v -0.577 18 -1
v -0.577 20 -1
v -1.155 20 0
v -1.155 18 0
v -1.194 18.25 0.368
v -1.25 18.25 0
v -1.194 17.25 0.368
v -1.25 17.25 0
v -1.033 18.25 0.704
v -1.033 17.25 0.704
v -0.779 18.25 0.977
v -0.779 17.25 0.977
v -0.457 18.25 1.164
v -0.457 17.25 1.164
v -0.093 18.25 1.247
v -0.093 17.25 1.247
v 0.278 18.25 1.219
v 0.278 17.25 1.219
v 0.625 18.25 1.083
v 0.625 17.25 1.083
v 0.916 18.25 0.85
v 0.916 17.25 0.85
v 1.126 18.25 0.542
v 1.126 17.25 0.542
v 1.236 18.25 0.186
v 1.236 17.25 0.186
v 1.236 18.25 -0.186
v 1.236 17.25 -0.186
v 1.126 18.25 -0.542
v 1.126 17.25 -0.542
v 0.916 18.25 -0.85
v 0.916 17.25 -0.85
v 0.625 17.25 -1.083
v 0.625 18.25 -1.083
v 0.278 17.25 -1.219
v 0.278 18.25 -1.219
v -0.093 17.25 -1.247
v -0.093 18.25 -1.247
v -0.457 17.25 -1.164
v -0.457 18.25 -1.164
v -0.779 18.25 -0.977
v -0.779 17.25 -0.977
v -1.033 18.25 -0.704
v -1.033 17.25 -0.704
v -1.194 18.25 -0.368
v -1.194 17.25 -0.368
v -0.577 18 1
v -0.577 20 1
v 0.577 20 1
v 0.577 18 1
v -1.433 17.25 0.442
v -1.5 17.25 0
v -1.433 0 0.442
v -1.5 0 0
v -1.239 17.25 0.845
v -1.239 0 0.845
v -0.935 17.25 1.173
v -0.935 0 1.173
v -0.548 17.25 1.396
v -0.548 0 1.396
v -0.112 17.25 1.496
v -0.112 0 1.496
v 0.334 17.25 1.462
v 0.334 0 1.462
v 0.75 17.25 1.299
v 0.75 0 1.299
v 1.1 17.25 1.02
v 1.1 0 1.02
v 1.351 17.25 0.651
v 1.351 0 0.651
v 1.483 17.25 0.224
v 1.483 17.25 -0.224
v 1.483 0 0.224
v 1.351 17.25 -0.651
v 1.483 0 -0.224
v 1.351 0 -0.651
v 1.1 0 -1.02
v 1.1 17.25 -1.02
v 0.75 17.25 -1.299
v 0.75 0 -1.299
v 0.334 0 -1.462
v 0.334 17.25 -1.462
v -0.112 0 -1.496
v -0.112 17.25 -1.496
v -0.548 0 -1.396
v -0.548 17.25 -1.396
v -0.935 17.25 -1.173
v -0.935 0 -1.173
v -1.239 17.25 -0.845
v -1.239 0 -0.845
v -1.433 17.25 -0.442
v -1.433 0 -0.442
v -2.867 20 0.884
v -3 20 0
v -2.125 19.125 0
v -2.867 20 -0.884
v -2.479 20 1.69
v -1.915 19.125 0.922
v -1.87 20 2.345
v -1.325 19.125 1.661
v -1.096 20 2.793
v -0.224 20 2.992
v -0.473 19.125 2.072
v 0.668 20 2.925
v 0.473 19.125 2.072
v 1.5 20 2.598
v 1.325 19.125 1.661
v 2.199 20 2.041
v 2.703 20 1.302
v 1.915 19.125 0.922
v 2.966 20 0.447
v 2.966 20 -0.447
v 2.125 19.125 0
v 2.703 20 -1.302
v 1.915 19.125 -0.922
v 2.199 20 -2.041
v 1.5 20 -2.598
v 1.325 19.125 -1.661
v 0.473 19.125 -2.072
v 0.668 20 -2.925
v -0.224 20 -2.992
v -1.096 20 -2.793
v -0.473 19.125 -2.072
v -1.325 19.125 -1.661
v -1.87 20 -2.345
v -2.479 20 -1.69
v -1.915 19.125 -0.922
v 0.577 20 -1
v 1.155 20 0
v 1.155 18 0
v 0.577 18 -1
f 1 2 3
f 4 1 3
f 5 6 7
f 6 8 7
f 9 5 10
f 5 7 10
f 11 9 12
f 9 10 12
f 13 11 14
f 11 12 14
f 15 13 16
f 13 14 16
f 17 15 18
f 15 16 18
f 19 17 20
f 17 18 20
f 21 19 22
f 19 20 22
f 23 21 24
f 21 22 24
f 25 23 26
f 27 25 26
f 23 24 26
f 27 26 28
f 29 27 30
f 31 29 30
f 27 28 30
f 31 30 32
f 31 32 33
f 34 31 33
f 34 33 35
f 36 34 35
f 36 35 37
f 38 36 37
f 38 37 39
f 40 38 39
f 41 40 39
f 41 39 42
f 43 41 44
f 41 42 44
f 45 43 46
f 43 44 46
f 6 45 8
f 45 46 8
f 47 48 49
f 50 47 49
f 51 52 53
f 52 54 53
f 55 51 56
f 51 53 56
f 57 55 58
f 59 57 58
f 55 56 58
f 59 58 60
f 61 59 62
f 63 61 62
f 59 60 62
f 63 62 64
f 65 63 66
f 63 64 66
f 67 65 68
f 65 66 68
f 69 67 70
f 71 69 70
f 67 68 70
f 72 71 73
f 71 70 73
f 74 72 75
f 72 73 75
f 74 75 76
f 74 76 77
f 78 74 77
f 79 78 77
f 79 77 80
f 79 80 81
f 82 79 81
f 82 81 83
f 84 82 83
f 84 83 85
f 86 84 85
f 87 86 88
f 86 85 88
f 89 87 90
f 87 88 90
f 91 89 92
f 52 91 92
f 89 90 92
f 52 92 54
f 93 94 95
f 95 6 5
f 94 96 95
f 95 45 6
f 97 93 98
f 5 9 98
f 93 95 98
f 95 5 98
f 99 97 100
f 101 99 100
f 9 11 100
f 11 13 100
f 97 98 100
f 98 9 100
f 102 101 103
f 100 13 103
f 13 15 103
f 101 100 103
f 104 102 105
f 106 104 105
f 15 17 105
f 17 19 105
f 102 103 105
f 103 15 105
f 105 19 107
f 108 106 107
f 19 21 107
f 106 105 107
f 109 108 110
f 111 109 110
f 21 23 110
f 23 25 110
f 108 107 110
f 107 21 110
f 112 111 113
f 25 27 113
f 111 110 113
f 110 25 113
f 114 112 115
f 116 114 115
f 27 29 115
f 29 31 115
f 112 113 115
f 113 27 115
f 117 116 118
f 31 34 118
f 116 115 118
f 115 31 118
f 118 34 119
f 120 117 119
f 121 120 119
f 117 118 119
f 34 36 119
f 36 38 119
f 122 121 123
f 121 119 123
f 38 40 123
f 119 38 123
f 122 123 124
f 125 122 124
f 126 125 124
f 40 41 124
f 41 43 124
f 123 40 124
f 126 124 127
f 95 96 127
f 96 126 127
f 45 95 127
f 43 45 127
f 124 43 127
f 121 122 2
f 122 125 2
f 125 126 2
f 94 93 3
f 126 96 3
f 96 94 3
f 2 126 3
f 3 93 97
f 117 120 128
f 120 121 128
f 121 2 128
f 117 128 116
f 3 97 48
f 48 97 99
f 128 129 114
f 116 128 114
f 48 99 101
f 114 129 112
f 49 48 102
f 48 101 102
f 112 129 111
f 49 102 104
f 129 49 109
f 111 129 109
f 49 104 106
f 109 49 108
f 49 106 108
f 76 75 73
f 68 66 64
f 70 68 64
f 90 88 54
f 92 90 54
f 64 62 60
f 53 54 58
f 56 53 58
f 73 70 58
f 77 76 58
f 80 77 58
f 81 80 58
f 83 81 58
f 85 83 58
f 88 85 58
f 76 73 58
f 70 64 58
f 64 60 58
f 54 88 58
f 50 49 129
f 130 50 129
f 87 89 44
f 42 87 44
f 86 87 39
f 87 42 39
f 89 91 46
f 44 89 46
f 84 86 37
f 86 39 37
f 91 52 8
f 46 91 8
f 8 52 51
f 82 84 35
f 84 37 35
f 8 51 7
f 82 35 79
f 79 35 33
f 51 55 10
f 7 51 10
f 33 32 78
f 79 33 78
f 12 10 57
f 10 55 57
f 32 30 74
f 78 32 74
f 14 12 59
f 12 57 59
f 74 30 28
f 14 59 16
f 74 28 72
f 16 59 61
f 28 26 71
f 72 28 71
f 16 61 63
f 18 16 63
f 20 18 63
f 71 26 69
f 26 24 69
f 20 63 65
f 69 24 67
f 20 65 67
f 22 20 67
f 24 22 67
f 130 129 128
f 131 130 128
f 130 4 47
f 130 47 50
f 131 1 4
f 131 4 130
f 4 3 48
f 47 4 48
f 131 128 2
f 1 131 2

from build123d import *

# Parameters (mm, degrees)
CUT_EXTRUDE_1_DEPTH = 2


with BuildPart() as part:
    # 草图1 → 旋转1 (revolve)
    with BuildSketch(Plane.XY):
        Polygon((0, 20), (-3, 20), (-1.25, 18.25), (-1.25, 17.25), (-1.5, 17.25), (-1.5, 0), (0, 0), align=None)
    revolve(axis=Axis((0, 0, 0), (0, 1, 0)))

    # 草图2 → 切除-拉伸1 (cut)
    with BuildSketch(Plane(origin=(0, 20, 0), x_dir=(1, 0, 0), z_dir=(0, 1, 0))):
        Polygon((0.577350269, 1), (-0.577350269, 1), (-1.154700538, 0), (-0.577350269, -1), (0.577350269, -1), (1.154700538, 0), align=None)
    extrude(amount=-CUT_EXTRUDE_1_DEPTH, mode=Mode.SUBTRACT)


solid = part.part
